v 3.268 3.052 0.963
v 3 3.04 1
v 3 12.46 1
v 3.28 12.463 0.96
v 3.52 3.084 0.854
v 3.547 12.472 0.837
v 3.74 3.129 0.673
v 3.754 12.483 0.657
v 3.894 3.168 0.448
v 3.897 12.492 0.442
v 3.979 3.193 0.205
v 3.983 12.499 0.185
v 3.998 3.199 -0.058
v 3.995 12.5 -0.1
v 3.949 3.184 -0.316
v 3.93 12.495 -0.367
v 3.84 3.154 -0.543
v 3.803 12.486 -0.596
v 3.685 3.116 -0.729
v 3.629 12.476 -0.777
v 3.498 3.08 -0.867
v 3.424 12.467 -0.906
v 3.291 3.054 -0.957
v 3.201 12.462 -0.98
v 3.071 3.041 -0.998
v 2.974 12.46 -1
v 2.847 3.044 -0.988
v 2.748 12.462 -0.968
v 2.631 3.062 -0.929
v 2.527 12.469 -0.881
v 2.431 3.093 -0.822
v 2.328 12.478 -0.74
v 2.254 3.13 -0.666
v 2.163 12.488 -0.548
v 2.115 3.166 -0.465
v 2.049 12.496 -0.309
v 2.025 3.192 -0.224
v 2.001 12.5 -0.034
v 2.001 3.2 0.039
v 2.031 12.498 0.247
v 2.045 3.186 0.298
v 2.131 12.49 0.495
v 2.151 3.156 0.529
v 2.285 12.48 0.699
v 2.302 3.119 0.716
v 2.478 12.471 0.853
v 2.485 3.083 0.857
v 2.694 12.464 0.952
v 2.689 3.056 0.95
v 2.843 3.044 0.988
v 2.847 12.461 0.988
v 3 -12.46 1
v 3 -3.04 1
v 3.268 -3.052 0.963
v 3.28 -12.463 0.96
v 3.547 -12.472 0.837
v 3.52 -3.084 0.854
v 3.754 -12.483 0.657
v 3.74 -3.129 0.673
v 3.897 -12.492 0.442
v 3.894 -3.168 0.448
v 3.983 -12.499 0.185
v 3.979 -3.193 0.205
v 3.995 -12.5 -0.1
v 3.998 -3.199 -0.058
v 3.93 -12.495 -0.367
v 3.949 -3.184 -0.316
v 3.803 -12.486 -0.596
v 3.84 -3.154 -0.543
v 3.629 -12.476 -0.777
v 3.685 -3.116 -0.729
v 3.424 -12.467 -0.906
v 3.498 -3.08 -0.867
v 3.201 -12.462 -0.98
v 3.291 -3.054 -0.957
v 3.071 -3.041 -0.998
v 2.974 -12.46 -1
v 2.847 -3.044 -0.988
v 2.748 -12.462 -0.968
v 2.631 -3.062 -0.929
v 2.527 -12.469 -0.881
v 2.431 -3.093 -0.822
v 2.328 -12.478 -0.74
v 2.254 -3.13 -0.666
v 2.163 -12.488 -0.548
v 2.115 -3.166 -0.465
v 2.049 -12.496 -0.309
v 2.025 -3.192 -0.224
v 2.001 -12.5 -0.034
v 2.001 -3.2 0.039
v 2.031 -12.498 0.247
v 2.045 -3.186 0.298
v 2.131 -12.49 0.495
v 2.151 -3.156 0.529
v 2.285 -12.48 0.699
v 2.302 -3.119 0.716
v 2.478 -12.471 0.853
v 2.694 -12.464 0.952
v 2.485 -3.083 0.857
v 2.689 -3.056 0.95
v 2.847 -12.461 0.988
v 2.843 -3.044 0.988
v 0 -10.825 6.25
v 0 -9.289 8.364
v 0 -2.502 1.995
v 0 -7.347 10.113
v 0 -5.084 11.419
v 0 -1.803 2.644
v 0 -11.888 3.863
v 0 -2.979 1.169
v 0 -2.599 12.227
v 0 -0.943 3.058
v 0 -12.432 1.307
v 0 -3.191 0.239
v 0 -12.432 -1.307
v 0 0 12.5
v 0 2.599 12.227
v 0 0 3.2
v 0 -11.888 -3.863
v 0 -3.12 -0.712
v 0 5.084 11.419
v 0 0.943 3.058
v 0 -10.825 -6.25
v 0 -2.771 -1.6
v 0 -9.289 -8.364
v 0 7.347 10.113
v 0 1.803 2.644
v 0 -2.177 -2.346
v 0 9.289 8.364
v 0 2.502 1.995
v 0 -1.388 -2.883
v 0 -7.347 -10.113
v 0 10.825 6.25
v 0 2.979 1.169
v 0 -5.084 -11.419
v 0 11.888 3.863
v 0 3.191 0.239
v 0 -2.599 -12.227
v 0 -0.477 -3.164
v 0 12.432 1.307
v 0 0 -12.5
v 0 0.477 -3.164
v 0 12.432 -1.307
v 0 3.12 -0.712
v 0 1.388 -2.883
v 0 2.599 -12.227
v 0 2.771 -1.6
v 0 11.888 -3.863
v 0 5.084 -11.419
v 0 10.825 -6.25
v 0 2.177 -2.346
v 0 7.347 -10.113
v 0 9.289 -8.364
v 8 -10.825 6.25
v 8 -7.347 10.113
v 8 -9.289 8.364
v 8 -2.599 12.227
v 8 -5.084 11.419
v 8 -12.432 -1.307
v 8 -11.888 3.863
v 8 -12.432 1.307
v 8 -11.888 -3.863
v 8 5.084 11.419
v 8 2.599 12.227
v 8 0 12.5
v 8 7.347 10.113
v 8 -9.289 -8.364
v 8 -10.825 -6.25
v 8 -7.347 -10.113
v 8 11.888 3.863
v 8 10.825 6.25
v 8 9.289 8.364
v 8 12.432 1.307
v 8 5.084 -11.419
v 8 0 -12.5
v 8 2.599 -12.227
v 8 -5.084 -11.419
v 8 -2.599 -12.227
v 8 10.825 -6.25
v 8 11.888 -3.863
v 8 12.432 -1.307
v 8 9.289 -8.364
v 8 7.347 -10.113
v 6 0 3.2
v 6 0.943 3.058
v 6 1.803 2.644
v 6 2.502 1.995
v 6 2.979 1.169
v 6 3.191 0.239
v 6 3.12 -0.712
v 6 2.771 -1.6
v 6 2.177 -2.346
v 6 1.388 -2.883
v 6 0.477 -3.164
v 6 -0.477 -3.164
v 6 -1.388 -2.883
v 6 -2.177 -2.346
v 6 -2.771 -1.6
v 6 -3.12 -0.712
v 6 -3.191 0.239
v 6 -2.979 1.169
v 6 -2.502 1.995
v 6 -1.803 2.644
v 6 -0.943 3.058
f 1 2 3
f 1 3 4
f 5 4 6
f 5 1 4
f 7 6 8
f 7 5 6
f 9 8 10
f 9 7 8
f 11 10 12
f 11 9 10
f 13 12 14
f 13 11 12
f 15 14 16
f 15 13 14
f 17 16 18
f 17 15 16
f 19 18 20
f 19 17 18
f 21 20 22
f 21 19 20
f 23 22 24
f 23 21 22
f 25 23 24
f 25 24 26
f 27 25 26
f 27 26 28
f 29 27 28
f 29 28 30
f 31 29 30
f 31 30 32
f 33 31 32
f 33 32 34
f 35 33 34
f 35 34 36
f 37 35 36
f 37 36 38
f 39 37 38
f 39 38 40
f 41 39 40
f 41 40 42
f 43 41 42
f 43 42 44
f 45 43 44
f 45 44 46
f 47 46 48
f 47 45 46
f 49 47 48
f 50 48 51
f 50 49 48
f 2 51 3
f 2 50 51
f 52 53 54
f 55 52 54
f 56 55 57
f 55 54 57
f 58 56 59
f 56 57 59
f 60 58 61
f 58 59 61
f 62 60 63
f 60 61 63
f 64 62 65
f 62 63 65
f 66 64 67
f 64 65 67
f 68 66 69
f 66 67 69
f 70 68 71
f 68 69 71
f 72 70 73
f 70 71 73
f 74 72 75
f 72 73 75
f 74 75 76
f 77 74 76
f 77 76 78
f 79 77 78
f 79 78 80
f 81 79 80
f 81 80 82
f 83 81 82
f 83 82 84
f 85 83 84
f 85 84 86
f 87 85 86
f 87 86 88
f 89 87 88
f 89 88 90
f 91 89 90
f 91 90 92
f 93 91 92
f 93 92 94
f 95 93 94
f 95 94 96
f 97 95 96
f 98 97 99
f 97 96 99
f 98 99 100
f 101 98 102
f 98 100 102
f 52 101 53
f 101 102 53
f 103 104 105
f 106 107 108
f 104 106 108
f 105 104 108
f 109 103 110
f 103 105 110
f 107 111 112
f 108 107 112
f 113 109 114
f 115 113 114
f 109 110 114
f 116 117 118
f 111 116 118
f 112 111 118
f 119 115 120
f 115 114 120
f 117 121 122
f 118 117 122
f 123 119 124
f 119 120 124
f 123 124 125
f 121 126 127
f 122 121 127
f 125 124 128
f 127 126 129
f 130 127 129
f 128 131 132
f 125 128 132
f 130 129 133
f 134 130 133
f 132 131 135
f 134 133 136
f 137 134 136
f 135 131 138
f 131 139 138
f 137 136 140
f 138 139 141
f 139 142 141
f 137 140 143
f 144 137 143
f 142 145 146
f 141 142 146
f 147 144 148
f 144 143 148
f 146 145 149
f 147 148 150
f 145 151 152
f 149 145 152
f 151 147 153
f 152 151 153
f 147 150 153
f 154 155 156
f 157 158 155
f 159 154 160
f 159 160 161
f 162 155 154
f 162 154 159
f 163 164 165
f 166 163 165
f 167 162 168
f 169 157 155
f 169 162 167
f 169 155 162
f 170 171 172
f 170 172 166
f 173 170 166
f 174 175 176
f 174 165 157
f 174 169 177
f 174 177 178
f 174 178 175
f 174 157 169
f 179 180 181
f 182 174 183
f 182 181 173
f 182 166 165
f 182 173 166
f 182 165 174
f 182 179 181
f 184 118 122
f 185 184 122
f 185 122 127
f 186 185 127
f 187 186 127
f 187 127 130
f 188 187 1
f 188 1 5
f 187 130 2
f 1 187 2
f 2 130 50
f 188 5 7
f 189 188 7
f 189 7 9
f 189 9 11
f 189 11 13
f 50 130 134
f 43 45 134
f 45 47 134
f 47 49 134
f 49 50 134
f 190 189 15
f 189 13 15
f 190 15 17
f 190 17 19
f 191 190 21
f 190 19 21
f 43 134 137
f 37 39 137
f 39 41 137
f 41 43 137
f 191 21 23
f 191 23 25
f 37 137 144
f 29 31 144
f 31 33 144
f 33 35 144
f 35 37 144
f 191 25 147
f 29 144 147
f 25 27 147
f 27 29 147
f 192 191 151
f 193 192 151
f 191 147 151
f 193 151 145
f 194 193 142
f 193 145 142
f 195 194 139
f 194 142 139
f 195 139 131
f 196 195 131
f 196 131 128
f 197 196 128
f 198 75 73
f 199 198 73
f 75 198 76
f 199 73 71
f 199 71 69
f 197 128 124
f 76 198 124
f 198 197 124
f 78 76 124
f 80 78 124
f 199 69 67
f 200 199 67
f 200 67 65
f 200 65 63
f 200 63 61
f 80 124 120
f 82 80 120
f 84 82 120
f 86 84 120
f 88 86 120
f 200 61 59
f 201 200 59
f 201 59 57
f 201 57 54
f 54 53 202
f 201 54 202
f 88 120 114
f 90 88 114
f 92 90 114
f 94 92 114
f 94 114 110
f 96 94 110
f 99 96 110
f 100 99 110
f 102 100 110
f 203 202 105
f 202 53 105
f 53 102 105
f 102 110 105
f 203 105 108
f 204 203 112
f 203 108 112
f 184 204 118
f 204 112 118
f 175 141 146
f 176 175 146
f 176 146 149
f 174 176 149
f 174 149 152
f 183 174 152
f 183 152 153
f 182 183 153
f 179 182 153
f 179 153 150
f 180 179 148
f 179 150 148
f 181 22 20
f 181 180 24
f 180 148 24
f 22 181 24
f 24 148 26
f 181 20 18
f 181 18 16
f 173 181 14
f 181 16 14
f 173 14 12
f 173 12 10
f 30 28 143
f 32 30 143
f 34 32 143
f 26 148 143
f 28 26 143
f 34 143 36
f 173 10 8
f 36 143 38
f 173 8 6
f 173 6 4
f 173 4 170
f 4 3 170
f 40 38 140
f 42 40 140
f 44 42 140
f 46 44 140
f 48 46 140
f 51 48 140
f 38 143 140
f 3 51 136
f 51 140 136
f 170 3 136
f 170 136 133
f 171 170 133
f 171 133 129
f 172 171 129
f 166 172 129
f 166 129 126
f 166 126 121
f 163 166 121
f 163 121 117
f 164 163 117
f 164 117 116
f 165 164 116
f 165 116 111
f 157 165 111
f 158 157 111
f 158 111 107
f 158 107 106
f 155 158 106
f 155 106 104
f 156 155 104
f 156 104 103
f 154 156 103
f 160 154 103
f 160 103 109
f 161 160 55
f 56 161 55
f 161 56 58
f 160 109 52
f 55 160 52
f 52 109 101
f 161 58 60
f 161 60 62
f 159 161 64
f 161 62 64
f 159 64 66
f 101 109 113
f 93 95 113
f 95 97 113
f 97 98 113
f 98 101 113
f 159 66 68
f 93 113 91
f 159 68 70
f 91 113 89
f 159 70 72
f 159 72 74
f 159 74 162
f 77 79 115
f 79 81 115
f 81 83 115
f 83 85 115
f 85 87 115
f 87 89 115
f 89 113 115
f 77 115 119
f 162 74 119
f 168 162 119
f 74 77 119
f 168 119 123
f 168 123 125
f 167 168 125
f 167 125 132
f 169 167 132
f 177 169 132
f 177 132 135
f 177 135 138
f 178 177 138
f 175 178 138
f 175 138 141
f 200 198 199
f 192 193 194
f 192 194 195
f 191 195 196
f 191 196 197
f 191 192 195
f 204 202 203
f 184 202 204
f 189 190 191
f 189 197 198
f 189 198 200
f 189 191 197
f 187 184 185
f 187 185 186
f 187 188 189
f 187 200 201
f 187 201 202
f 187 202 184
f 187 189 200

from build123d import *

# Parameters (mm, degrees)
SKETCH_1_R                      = 12.5
EXTRUDE_1_DEPTH                 = 8
SKETCH_2_R                      = 3.2
CUT_EXTRUDE_1_DEPTH             = 6
CUT_EXTRUDE_2_REACH             = 21.404
SKETCH_3_R                      = 1
CUT_EXTRUDE_2_DIRECTION_2_REACH = 21.404


with BuildPart() as part:
    # 草图1 → 凸台-拉伸1 (new body)
    with BuildSketch(Plane(origin=(0, 0, 0), x_dir=(0, 0, -1), z_dir=(1, 0, 0))):
        Circle(SKETCH_1_R)
    extrude(amount=EXTRUDE_1_DEPTH)

    # 草图2 → 切除-拉伸1 (cut)
    with BuildSketch(Plane.ZY):
        Circle(SKETCH_2_R)
    extrude(amount=-CUT_EXTRUDE_1_DEPTH, mode=Mode.SUBTRACT)

    # 草图3 → 切除-拉伸2 (cut, up to next)
    with BuildSketch(Plane(origin=(0, 0, 0), x_dir=(1, 0, 0), z_dir=(0, 1, 0)), mode=Mode.PRIVATE) as cut_extrude_2_sk1:
        with Locations(Location((3, 0, 0), (0, 0, 270))):
            Circle(SKETCH_3_R)
    cut_extrude_2_tool1 = extrude(cut_extrude_2_sk1.sketch, amount=-CUT_EXTRUDE_2_REACH, mode=Mode.PRIVATE) & part.part
    add(cut_extrude_2_tool1.solids().sort_by_distance((3, 0, 0))[0], mode=Mode.SUBTRACT)

    # 草图3 → 切除-拉伸2 direction 2 (cut, up to next)
    with BuildSketch(Plane(origin=(0, 0, 0), x_dir=(1, 0, 0), z_dir=(0, 1, 0)), mode=Mode.PRIVATE) as cut_extrude_2_direction_2_sk1:
        with Locations(Location((3, 0, 0), (0, 0, 270))):
            Circle(SKETCH_3_R)
    cut_extrude_2_direction_2_tool1 = extrude(cut_extrude_2_direction_2_sk1.sketch, amount=CUT_EXTRUDE_2_DIRECTION_2_REACH, mode=Mode.PRIVATE) & part.part
    add(cut_extrude_2_direction_2_tool1.solids().sort_by_distance((3, 0, 0))[0], mode=Mode.SUBTRACT)


solid = part.part
